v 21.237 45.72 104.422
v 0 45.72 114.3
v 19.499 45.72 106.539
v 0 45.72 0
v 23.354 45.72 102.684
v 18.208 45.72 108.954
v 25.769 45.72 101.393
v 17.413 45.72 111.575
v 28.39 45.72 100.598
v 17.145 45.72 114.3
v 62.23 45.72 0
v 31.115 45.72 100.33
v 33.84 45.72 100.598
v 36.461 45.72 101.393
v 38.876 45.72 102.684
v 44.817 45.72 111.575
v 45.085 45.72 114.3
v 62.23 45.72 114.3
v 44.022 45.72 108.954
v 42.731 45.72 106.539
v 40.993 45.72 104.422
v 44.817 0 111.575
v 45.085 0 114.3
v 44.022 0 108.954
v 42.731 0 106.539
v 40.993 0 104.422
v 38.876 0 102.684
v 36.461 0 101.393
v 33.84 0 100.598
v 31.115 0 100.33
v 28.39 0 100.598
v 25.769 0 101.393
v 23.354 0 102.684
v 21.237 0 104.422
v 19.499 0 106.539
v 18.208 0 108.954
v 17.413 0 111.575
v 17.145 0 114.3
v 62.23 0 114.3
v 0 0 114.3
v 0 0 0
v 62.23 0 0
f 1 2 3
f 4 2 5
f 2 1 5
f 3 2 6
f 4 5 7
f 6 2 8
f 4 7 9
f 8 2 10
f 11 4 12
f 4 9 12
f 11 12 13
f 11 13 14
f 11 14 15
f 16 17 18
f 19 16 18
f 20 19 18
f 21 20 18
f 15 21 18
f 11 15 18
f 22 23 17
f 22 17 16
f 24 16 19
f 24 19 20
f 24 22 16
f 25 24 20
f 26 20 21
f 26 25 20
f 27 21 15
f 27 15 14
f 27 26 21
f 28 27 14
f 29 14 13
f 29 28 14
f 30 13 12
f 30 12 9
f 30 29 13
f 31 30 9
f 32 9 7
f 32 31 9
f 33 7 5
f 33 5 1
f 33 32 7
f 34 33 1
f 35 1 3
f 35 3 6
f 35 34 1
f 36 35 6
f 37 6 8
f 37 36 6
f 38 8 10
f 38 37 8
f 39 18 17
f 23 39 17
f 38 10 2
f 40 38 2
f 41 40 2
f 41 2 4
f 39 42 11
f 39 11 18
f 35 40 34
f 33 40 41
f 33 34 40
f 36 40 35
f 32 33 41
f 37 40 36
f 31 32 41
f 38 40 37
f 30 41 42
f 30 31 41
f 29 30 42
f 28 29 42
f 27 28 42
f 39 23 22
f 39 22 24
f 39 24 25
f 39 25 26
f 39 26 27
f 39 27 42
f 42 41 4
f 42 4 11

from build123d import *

# Parameters (mm, degrees)
F1_DEPTH = 45.72


with BuildPart() as f1:
    # F0 (on Front) → F1 (new body)
    with BuildSketch(Plane.XZ):
        with BuildLine():
            Line((0, 114.3), (0, 0))
            Line((0, 0), (62.23, 0))
            Line((62.23, 0), (62.23, 114.3))
            Line((62.23, 114.3), (45.085, 114.3))
            ThreePointArc((45.085, 114.3), (31.115, 100.33), (17.145, 114.3))
            Line((17.145, 114.3), (0, 114.3))
        make_face()
    extrude(amount=-F1_DEPTH)


solid = f1.part
